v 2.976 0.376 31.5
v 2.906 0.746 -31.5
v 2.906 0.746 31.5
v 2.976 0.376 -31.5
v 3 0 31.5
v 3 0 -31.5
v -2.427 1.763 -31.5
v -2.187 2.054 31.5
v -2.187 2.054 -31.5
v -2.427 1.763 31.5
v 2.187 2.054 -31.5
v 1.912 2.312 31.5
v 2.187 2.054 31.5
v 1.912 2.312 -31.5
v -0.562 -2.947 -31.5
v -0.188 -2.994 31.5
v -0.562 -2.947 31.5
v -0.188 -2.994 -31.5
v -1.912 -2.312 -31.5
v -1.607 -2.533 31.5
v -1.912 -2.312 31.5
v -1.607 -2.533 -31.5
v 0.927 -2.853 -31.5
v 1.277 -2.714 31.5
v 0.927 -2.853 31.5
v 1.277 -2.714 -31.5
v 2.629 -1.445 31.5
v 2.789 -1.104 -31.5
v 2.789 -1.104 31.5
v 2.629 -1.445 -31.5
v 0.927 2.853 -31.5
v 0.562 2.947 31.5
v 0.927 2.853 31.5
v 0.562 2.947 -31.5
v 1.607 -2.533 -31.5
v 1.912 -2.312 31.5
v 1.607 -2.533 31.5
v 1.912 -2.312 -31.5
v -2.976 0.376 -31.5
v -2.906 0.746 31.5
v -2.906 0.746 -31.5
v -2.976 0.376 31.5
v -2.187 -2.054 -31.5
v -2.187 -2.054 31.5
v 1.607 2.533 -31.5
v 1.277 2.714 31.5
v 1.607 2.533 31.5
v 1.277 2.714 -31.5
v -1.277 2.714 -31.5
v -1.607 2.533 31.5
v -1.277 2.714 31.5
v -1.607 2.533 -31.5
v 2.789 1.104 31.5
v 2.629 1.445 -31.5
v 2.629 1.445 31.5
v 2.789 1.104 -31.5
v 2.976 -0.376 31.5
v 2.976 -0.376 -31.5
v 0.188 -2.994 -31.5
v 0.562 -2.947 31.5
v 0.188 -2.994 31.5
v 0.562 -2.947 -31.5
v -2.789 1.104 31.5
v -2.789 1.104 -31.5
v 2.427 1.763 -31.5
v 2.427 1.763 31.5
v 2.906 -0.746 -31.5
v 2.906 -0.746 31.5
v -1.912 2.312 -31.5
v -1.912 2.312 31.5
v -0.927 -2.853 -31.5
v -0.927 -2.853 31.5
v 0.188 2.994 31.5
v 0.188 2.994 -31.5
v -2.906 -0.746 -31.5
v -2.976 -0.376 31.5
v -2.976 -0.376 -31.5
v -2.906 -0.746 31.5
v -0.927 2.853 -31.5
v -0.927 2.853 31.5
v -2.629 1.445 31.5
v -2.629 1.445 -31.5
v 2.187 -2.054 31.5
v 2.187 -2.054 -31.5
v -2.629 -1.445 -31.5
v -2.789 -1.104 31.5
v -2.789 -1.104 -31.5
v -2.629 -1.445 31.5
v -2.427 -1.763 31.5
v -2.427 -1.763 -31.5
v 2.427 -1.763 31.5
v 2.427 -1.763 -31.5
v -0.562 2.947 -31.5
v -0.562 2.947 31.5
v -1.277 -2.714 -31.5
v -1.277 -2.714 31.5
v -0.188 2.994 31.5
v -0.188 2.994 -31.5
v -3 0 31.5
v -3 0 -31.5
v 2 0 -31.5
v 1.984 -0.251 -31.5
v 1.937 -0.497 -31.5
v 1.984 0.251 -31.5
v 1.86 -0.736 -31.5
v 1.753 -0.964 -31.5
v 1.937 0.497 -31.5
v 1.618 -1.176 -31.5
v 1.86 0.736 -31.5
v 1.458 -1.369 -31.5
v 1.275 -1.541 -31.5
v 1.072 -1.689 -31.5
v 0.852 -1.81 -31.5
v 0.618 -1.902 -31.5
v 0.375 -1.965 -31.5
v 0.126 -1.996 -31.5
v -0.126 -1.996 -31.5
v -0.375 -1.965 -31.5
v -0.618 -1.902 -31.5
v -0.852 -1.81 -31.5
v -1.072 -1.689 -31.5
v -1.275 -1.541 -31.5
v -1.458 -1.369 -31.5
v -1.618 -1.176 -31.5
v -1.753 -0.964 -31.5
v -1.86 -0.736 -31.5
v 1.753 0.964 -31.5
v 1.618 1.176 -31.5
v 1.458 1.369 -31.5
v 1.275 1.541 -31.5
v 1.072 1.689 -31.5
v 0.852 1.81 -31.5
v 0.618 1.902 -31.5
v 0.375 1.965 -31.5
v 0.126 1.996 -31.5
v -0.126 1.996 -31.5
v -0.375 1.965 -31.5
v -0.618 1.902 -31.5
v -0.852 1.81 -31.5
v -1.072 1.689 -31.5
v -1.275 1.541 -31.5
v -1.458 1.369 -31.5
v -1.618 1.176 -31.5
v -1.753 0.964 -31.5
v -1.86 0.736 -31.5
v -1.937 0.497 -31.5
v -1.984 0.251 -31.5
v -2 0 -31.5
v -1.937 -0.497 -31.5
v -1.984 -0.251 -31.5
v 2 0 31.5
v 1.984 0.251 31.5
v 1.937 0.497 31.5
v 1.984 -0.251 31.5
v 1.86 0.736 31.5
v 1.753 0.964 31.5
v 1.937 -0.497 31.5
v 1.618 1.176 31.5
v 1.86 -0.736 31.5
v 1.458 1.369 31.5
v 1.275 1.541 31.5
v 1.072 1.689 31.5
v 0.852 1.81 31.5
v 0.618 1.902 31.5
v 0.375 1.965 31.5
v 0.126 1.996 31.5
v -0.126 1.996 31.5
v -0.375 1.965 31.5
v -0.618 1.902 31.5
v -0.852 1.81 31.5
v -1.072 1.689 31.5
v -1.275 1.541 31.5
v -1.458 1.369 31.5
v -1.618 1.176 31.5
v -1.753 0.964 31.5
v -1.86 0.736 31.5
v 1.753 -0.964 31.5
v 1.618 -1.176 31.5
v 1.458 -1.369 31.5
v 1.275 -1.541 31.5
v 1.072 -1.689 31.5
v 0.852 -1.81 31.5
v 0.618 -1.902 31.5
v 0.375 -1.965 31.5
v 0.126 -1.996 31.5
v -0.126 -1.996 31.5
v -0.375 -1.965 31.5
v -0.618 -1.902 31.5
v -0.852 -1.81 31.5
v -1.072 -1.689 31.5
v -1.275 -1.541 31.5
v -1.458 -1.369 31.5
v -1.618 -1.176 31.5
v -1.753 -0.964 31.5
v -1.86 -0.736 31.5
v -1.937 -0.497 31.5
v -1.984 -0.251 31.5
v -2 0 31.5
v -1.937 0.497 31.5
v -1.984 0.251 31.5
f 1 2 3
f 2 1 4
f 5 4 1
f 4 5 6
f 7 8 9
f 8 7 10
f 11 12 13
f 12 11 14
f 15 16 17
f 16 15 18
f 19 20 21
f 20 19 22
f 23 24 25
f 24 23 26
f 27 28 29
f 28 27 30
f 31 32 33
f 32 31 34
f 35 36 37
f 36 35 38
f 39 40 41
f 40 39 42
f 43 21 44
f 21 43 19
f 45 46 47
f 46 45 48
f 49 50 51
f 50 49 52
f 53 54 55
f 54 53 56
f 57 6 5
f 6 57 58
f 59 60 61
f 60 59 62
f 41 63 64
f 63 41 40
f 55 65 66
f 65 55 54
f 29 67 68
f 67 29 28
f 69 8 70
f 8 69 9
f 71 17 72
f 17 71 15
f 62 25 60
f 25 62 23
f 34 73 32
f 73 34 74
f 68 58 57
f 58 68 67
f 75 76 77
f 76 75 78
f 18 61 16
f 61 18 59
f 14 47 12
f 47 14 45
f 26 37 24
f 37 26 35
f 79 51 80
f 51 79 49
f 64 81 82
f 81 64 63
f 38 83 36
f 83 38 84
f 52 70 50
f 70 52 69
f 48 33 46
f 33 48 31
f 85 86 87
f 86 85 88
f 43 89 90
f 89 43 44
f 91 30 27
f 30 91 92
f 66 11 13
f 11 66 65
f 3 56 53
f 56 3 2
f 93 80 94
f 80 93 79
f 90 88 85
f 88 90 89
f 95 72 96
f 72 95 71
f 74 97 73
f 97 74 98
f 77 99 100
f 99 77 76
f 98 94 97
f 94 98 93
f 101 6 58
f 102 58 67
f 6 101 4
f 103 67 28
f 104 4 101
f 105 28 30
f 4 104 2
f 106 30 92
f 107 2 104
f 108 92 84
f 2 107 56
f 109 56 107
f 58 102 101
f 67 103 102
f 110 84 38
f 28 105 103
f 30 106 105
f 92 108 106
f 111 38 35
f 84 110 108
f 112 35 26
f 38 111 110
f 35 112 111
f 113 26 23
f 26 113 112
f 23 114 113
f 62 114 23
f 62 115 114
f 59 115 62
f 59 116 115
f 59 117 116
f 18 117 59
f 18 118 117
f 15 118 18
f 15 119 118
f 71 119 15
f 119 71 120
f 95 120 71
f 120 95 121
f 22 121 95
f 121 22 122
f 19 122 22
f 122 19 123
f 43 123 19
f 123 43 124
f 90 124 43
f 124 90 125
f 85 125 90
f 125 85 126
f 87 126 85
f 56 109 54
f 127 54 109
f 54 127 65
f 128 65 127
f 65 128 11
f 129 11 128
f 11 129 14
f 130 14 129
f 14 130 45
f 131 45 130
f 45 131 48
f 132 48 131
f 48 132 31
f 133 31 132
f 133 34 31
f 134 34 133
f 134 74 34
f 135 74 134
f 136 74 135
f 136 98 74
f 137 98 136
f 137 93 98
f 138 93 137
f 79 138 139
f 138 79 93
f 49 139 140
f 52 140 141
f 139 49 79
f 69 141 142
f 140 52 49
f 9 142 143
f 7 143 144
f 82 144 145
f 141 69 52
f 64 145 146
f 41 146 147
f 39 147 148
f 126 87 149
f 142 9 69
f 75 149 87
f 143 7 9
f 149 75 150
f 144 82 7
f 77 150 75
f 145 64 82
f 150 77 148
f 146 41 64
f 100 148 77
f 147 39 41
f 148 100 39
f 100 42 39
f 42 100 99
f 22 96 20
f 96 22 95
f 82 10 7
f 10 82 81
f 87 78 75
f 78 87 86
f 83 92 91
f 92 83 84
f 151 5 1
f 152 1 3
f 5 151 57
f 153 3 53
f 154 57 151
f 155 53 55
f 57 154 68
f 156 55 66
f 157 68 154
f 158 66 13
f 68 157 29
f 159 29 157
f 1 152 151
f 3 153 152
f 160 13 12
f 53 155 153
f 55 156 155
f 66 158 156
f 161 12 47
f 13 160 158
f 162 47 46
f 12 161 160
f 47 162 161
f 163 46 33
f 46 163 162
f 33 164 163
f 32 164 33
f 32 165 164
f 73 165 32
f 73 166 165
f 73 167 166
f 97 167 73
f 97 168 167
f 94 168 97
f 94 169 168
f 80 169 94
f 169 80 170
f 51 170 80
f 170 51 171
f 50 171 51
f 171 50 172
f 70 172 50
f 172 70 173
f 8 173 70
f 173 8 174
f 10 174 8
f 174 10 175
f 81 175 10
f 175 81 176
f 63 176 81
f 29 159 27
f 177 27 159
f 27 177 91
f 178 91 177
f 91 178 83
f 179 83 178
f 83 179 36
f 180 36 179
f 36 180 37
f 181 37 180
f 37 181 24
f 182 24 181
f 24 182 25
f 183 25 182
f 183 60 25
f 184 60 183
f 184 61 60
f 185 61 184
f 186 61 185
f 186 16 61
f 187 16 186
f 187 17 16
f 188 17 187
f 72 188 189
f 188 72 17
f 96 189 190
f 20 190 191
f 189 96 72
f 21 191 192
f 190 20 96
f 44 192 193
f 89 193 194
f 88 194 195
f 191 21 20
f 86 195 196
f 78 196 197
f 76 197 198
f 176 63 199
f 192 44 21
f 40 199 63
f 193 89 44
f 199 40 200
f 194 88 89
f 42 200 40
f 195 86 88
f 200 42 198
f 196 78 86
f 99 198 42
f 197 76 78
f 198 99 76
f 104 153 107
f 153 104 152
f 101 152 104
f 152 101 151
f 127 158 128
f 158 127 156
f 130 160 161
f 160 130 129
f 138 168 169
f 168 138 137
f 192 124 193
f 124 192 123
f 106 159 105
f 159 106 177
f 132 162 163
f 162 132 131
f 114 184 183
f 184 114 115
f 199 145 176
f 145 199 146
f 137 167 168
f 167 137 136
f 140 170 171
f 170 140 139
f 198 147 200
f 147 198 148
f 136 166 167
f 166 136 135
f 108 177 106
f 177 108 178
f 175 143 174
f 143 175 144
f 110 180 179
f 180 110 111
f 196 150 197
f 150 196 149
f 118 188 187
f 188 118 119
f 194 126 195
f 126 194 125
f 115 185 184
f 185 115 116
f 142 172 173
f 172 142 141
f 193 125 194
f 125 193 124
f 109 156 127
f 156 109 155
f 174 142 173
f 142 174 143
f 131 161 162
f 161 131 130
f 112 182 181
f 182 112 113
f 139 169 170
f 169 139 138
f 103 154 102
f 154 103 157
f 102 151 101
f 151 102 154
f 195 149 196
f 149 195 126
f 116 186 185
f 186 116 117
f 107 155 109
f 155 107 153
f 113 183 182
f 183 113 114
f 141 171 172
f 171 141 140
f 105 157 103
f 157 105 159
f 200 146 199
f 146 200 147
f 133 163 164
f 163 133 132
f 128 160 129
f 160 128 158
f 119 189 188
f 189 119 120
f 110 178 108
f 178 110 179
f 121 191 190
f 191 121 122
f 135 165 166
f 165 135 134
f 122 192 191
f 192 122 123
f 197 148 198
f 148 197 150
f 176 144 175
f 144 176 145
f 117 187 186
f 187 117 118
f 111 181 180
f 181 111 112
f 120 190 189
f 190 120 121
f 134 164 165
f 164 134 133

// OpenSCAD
$fn = 50;


difference() {
	union() {
		translate(v = [0, 0, -31.5000000000]) {
			cylinder(h = 63, r = 3.0000000000);
		}
	}
	union() {
		translate(v = [0, 0, -100.0000000000]) {
			cylinder(h = 200, r = 2.0000000000);
		}
	}
}
